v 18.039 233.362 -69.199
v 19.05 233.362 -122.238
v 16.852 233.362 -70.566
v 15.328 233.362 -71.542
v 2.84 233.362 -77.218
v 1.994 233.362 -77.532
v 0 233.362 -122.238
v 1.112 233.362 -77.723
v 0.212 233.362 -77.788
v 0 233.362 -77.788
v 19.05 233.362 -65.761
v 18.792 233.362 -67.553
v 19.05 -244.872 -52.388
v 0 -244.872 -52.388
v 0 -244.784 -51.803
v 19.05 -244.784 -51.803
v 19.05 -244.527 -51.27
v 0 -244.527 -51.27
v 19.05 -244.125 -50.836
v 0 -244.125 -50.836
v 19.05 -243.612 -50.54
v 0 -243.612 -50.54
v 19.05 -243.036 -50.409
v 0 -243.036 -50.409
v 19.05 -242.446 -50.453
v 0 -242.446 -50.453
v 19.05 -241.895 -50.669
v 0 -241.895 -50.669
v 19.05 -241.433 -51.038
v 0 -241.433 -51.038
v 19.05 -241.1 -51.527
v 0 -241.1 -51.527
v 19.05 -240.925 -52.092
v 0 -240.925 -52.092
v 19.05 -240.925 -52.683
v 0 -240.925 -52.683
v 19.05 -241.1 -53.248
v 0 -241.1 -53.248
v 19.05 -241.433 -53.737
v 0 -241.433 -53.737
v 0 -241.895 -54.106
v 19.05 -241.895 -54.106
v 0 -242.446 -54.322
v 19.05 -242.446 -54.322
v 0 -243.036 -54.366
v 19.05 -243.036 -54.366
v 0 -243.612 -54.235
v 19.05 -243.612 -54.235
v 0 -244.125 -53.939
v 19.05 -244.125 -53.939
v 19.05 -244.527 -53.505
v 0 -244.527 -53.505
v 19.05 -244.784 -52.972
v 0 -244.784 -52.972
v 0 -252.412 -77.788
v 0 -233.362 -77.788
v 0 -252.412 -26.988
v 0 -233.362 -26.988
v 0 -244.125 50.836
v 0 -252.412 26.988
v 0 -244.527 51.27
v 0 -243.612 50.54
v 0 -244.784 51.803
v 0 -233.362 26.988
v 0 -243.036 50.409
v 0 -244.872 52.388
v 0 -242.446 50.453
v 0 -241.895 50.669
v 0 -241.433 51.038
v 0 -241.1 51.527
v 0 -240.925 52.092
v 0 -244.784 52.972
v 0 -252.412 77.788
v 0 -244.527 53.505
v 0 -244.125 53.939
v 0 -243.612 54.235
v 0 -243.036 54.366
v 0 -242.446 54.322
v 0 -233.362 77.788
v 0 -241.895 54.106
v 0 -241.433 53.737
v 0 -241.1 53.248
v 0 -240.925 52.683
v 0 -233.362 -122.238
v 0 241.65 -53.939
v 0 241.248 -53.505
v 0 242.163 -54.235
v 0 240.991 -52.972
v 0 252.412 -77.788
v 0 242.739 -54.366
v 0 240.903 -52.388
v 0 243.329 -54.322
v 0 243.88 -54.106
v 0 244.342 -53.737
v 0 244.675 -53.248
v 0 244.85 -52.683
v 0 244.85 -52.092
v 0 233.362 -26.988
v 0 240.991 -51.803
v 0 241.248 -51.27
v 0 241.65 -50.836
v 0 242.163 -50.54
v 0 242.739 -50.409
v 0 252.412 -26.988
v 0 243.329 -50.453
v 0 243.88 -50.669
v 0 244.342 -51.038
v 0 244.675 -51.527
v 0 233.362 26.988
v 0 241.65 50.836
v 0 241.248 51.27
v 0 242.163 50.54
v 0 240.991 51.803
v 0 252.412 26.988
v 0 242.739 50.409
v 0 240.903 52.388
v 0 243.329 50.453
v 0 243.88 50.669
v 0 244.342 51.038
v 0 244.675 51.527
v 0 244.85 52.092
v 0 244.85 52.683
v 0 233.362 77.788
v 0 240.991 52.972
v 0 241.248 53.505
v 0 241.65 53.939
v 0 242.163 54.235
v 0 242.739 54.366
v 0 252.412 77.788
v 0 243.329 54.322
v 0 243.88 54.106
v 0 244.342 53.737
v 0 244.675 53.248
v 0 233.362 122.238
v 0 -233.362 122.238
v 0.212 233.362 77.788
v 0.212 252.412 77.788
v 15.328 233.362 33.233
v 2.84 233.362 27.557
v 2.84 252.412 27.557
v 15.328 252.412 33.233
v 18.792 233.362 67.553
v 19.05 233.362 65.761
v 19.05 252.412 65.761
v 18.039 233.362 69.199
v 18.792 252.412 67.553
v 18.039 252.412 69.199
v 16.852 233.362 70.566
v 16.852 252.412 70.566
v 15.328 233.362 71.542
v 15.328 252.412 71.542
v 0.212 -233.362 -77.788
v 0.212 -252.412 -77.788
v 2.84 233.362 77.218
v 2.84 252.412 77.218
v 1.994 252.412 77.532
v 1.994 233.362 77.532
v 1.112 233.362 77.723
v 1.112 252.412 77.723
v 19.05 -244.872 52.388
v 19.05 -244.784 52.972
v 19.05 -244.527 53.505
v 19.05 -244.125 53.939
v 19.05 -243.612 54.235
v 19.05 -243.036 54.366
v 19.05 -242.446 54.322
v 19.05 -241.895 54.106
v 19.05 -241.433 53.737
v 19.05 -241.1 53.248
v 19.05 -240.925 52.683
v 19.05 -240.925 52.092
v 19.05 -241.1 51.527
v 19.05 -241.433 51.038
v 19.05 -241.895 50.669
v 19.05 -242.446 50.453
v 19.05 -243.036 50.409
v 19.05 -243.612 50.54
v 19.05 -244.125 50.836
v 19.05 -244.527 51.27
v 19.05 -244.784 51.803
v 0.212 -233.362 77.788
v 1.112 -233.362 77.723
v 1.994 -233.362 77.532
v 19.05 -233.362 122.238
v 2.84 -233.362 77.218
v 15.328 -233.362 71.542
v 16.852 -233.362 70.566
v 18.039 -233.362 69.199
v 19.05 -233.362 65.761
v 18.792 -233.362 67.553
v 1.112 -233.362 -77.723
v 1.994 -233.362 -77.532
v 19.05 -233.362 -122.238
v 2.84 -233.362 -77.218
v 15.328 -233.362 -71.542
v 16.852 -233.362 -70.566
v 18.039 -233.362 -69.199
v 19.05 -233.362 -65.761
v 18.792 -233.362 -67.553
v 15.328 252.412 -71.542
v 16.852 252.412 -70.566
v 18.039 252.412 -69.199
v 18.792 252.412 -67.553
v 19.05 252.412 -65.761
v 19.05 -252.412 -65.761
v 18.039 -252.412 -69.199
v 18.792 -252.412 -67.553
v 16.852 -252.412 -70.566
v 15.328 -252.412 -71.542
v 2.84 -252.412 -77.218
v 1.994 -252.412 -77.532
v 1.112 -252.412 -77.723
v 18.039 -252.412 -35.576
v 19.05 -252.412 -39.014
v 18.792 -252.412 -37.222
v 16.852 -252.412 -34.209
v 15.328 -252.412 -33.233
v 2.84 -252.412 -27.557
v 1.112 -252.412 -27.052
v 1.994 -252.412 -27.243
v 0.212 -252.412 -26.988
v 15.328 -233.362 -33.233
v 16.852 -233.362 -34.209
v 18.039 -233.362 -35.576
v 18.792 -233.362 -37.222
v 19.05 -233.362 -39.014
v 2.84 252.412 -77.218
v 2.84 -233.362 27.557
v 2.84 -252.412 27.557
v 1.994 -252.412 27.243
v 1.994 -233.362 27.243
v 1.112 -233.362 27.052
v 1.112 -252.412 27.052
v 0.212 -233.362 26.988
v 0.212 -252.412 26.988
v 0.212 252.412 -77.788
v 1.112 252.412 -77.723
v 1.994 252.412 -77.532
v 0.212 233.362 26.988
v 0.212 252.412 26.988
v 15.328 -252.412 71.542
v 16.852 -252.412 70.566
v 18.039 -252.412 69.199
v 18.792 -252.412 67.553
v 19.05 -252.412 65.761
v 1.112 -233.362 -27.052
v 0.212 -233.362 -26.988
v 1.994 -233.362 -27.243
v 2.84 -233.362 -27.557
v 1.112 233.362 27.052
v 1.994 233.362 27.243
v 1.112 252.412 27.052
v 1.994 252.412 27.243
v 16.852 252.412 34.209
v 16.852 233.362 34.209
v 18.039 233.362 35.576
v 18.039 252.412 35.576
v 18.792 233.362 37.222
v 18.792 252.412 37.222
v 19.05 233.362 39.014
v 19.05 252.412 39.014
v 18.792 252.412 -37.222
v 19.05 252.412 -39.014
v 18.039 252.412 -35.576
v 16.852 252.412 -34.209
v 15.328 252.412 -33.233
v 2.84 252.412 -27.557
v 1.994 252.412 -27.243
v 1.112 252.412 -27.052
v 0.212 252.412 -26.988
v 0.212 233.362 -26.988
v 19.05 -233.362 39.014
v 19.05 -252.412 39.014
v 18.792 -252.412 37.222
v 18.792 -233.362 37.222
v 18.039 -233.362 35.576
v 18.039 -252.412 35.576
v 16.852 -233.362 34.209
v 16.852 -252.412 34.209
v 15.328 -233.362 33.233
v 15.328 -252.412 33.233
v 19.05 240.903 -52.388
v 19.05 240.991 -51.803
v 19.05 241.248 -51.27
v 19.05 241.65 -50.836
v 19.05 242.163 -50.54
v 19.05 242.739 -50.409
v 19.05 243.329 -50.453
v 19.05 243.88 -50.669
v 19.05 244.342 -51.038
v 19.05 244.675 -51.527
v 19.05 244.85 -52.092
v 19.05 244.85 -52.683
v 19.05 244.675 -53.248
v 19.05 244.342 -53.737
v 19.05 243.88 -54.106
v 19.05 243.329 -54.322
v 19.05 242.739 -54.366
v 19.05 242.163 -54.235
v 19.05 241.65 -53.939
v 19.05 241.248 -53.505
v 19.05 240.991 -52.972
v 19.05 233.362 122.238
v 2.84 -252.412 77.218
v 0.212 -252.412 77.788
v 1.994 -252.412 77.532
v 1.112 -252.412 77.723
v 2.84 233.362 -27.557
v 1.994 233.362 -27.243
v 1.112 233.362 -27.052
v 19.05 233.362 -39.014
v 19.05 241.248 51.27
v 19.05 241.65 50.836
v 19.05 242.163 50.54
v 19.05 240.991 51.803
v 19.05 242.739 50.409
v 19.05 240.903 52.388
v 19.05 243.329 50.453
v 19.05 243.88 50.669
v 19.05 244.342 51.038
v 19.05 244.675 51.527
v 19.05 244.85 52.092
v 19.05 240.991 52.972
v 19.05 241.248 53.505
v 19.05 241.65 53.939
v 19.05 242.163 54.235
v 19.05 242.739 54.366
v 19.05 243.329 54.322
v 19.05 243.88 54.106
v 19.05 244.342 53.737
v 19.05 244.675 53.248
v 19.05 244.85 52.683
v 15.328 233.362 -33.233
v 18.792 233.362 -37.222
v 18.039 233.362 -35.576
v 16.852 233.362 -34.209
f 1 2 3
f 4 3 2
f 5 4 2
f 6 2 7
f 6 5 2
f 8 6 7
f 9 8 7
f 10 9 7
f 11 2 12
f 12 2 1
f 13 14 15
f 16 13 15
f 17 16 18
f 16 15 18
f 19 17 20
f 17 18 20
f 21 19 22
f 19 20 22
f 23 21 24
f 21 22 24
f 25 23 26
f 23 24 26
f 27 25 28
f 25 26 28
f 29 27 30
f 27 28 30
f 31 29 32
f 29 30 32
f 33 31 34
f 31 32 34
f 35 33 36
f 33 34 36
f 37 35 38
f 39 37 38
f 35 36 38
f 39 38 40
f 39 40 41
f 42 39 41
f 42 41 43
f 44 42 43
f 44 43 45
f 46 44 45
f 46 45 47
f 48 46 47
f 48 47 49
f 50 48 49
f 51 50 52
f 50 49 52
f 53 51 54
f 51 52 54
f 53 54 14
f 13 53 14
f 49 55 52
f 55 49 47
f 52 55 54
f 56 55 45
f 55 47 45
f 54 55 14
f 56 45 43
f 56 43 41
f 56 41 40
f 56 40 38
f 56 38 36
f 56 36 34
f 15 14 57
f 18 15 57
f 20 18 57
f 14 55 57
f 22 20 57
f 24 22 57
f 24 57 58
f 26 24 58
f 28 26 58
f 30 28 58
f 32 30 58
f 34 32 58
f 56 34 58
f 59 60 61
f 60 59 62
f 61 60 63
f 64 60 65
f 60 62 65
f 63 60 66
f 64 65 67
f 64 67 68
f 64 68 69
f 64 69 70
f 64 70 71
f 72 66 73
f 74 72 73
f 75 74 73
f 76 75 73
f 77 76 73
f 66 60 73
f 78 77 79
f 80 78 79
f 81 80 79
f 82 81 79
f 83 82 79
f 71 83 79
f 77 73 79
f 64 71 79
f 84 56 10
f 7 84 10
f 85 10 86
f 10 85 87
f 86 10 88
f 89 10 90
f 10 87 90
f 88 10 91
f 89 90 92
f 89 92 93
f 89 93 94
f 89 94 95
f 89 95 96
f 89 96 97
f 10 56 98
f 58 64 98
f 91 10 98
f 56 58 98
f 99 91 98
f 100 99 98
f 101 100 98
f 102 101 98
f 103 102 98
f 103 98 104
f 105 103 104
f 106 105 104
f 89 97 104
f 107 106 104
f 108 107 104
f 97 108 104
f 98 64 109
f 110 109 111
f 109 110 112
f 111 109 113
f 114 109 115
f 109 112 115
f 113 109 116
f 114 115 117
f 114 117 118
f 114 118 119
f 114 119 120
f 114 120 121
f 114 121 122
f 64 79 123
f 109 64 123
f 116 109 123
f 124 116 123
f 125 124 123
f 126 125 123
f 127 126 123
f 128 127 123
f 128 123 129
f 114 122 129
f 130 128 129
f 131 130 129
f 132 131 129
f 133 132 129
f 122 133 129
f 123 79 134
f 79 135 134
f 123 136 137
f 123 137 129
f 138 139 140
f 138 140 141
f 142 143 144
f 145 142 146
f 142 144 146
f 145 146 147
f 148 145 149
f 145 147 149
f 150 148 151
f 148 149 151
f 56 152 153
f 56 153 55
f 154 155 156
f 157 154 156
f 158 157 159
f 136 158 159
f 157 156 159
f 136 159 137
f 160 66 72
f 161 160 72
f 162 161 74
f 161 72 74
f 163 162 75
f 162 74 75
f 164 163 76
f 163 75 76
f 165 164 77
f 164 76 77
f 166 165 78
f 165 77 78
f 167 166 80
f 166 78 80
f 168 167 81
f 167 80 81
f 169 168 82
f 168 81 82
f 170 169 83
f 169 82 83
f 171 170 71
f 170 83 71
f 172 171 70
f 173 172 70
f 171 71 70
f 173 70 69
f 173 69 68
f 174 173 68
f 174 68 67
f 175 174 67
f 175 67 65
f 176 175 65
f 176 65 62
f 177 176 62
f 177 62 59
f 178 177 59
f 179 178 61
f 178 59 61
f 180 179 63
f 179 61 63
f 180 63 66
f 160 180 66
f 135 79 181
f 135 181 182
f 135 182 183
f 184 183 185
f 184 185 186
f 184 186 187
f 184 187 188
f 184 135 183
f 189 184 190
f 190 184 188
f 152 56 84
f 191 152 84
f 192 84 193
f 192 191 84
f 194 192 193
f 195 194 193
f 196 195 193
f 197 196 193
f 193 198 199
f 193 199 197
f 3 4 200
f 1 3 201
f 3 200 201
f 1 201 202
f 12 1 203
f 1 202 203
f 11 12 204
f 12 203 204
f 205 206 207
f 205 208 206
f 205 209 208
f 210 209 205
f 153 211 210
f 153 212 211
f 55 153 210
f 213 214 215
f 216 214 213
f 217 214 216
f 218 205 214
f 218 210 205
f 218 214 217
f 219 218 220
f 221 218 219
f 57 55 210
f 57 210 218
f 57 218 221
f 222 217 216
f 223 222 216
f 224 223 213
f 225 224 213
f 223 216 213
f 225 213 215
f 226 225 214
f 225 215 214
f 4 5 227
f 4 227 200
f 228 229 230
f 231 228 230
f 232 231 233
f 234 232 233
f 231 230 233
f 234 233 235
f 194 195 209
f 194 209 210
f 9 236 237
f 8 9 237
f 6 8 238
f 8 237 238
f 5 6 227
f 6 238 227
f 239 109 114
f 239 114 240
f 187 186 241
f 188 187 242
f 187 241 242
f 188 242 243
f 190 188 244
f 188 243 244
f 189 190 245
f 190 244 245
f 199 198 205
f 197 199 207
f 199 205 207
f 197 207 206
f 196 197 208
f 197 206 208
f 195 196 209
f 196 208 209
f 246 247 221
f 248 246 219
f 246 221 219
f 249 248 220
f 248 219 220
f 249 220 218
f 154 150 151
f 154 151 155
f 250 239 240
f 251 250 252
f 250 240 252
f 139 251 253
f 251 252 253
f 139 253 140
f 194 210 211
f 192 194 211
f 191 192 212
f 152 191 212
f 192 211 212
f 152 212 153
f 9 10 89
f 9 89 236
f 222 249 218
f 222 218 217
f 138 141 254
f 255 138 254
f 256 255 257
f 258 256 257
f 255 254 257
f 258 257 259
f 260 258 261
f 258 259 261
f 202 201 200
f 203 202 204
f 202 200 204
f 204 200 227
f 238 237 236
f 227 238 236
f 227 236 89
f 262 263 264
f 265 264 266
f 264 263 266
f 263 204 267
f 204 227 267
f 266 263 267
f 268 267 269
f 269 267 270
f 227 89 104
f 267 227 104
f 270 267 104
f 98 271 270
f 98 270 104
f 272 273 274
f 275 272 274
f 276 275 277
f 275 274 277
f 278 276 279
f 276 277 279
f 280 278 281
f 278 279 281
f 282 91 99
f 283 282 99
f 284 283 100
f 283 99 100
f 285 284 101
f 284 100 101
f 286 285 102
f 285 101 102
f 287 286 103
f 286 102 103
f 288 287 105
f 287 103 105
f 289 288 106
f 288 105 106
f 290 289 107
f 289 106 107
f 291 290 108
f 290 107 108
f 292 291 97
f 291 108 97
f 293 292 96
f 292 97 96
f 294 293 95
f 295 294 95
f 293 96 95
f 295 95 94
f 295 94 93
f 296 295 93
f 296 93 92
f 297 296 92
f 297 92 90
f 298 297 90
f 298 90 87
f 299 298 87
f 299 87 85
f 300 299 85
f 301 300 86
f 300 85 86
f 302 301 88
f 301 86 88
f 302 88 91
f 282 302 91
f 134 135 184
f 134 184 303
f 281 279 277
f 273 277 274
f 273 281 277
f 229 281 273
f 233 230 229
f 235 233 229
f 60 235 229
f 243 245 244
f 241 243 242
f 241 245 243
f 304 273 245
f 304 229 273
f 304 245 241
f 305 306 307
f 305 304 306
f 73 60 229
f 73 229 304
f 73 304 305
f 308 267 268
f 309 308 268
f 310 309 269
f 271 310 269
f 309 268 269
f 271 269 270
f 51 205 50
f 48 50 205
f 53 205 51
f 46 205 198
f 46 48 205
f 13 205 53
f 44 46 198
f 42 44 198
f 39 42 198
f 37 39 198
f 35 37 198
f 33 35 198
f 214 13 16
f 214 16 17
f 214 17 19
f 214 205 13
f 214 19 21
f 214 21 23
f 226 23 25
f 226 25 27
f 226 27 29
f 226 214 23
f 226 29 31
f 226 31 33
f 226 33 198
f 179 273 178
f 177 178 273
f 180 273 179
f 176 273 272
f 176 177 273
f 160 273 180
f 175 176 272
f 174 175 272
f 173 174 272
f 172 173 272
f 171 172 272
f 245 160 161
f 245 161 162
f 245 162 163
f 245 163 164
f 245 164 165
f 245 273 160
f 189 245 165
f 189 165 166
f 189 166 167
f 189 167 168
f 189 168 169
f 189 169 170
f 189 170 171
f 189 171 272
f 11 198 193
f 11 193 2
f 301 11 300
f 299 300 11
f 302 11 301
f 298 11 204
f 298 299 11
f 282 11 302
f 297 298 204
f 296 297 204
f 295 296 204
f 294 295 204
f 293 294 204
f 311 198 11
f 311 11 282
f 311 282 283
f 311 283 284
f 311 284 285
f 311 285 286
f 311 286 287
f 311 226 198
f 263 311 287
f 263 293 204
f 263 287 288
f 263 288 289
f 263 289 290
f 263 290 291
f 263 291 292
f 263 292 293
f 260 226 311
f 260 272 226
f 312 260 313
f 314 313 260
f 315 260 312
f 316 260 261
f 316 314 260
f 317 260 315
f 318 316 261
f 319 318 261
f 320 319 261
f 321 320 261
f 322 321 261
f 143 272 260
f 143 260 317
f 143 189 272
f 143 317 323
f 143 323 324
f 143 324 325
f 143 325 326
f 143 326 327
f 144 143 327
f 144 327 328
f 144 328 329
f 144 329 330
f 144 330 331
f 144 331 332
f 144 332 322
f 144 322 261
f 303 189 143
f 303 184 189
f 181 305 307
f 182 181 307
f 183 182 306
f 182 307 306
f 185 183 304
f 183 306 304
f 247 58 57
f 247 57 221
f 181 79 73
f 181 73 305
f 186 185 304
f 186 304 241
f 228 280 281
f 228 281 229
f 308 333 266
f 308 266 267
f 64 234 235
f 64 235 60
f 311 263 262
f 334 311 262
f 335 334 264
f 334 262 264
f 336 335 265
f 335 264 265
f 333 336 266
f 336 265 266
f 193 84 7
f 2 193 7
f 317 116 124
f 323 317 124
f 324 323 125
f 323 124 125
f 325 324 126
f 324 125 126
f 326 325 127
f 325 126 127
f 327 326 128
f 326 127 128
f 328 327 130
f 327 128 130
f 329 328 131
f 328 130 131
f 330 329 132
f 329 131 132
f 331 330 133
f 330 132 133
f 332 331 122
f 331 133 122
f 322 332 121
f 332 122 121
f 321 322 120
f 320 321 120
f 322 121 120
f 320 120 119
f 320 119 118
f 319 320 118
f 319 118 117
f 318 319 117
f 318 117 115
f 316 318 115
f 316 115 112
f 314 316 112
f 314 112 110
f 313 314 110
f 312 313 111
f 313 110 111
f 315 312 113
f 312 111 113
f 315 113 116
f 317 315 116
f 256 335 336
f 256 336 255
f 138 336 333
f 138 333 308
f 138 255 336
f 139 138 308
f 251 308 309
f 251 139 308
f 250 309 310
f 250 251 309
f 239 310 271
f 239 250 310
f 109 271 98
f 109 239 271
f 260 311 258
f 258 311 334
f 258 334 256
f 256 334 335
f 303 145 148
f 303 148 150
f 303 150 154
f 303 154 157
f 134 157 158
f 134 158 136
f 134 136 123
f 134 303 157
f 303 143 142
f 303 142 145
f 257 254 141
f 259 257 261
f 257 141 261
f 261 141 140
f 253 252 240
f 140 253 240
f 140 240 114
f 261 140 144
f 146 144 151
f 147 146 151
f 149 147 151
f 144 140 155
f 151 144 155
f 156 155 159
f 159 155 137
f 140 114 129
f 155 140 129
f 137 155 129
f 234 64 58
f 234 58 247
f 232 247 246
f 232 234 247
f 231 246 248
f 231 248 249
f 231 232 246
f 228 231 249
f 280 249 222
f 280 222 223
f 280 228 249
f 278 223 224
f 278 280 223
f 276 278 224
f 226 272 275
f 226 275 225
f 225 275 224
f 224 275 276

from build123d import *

# Parameters (mm, degrees)
F0_W     = 504.825
F0_H     = 244.475
F1_DEPTH = 19.05
F4_DEPTH = 19.05
F5_DEPTH = 19.05
F6_R     = 1.984375
F7_DEPTH = 19.05


with BuildPart() as f1:
    # F0 (on Right) → F1 (new body)
    with BuildSketch(Plane.YZ):
        Rectangle(F0_W, F0_H)
    extrude(amount=F1_DEPTH)

    # F3 (on face) → F4 (cut)
    with BuildSketch(Plane(origin=(0, 252.4125, 0), x_dir=(-1, 0, 0), z_dir=(0, 1, 0))):
        with BuildLine():
            Line((0, 77.7875), (0, 122.2375))
            Line((0, 122.2375), (-19.05, 122.2375))
            Line((-19.05, 122.2375), (-19.05, 65.761152))
            ThreePointArc((-19.05, 65.761152), (-18.038918, 69.19895), (-15.327651, 71.541978))
            Line((-15.327651, 71.541978), (-2.839702, 77.218326))
            ThreePointArc((-2.839702, 77.218326), (-1.556345, 77.643575), (-0.21205, 77.7875))
            Line((-0.21205, 77.7875), (0, 77.7875))
        make_face()
        with BuildLine():
            Line((0, -26.9875), (0, 26.9875))
            Line((0, 26.9875), (-0.21205, 26.9875))
            ThreePointArc((-0.21205, 26.9875), (-1.556345, 27.131425), (-2.839702, 27.556674))
            Line((-2.839702, 27.556674), (-15.327651, 33.233022))
            ThreePointArc((-15.327651, 33.233022), (-18.038918, 35.57605), (-19.05, 39.013848))
            Line((-19.05, 39.013848), (-19.05, -39.013848))
            ThreePointArc((-19.05, -39.013848), (-18.038918, -35.57605), (-15.327651, -33.233022))
            Line((-15.327651, -33.233022), (-2.839702, -27.556674))
            ThreePointArc((-2.839702, -27.556674), (-1.556345, -27.131425), (-0.21205, -26.9875))
            Line((-0.21205, -26.9875), (0, -26.9875))
        make_face()
        with BuildLine():
            Line((0, -122.2375), (0, -77.7875))
            Line((0, -77.7875), (-0.21205, -77.7875))
            ThreePointArc((-0.21205, -77.7875), (-1.556345, -77.643575), (-2.839702, -77.218326))
            Line((-2.839702, -77.218326), (-15.327651, -71.541978))
            ThreePointArc((-15.327651, -71.541978), (-18.038918, -69.19895), (-19.05, -65.761152))
            Line((-19.05, -65.761152), (-19.05, -122.2375))
            Line((-19.05, -122.2375), (0, -122.2375))
        make_face()
    extrude(amount=-F4_DEPTH, mode=Mode.SUBTRACT)

    # F2 (on face) → F5 (cut)
    with BuildSketch(Plane.XZ.offset(252.4125)):
        with BuildLine():
            Line((0, 122.2375), (0, 77.7875))
            Line((0, 77.7875), (0.21205, 77.7875))
            ThreePointArc((0.21205, 77.7875), (1.556345, 77.643575), (2.839702, 77.218326))
            Line((2.839702, 77.218326), (15.327651, 71.541978))
            ThreePointArc((15.327651, 71.541978), (18.038918, 69.19895), (19.05, 65.761152))
            Line((19.05, 65.761152), (19.05, 122.2375))
            Line((19.05, 122.2375), (0, 122.2375))
        make_face()
        with BuildLine():
            Line((0, 26.9875), (0, -26.9875))
            Line((0, -26.9875), (0.21205, -26.9875))
            ThreePointArc((0.21205, -26.9875), (1.556345, -27.131425), (2.839702, -27.556674))
            Line((2.839702, -27.556674), (15.327651, -33.233022))
            ThreePointArc((15.327651, -33.233022), (18.038918, -35.57605), (19.05, -39.013848))
            Line((19.05, -39.013848), (19.05, 39.013848))
            ThreePointArc((19.05, 39.013848), (18.038918, 35.57605), (15.327651, 33.233022))
            Line((15.327651, 33.233022), (2.839702, 27.556674))
            ThreePointArc((2.839702, 27.556674), (1.556345, 27.131425), (0.21205, 26.9875))
            Line((0.21205, 26.9875), (0, 26.9875))
        make_face()
        with BuildLine():
            Line((0, -77.7875), (0, -122.2375))
            Line((0, -122.2375), (19.05, -122.2375))
            Line((19.05, -122.2375), (19.05, -65.761152))
            ThreePointArc((19.05, -65.761152), (18.038918, -69.19895), (15.327651, -71.541978))
            Line((15.327651, -71.541978), (2.839702, -77.218326))
            ThreePointArc((2.839702, -77.218326), (1.556345, -77.643575), (0.21205, -77.7875))
            Line((0.21205, -77.7875), (0, -77.7875))
        make_face()
    extrude(amount=-F5_DEPTH, mode=Mode.SUBTRACT)

    # F6 (on face) → F7 (cut)
    with BuildSketch(Plane(origin=(0, 0, 0), x_dir=(0, -1, 0), z_dir=(-1, 0, 0))):
        with Locations((-242.8875, -52.3875)):
            Circle(F6_R)
        with Locations((-242.8875, 52.3875)):
            Circle(F6_R)
        with Locations((242.8875, 52.3875)):
            Circle(F6_R)
        with Locations((242.8875, -52.3875)):
            Circle(F6_R)
    extrude(amount=-F7_DEPTH, mode=Mode.SUBTRACT)


solid = f1.part
